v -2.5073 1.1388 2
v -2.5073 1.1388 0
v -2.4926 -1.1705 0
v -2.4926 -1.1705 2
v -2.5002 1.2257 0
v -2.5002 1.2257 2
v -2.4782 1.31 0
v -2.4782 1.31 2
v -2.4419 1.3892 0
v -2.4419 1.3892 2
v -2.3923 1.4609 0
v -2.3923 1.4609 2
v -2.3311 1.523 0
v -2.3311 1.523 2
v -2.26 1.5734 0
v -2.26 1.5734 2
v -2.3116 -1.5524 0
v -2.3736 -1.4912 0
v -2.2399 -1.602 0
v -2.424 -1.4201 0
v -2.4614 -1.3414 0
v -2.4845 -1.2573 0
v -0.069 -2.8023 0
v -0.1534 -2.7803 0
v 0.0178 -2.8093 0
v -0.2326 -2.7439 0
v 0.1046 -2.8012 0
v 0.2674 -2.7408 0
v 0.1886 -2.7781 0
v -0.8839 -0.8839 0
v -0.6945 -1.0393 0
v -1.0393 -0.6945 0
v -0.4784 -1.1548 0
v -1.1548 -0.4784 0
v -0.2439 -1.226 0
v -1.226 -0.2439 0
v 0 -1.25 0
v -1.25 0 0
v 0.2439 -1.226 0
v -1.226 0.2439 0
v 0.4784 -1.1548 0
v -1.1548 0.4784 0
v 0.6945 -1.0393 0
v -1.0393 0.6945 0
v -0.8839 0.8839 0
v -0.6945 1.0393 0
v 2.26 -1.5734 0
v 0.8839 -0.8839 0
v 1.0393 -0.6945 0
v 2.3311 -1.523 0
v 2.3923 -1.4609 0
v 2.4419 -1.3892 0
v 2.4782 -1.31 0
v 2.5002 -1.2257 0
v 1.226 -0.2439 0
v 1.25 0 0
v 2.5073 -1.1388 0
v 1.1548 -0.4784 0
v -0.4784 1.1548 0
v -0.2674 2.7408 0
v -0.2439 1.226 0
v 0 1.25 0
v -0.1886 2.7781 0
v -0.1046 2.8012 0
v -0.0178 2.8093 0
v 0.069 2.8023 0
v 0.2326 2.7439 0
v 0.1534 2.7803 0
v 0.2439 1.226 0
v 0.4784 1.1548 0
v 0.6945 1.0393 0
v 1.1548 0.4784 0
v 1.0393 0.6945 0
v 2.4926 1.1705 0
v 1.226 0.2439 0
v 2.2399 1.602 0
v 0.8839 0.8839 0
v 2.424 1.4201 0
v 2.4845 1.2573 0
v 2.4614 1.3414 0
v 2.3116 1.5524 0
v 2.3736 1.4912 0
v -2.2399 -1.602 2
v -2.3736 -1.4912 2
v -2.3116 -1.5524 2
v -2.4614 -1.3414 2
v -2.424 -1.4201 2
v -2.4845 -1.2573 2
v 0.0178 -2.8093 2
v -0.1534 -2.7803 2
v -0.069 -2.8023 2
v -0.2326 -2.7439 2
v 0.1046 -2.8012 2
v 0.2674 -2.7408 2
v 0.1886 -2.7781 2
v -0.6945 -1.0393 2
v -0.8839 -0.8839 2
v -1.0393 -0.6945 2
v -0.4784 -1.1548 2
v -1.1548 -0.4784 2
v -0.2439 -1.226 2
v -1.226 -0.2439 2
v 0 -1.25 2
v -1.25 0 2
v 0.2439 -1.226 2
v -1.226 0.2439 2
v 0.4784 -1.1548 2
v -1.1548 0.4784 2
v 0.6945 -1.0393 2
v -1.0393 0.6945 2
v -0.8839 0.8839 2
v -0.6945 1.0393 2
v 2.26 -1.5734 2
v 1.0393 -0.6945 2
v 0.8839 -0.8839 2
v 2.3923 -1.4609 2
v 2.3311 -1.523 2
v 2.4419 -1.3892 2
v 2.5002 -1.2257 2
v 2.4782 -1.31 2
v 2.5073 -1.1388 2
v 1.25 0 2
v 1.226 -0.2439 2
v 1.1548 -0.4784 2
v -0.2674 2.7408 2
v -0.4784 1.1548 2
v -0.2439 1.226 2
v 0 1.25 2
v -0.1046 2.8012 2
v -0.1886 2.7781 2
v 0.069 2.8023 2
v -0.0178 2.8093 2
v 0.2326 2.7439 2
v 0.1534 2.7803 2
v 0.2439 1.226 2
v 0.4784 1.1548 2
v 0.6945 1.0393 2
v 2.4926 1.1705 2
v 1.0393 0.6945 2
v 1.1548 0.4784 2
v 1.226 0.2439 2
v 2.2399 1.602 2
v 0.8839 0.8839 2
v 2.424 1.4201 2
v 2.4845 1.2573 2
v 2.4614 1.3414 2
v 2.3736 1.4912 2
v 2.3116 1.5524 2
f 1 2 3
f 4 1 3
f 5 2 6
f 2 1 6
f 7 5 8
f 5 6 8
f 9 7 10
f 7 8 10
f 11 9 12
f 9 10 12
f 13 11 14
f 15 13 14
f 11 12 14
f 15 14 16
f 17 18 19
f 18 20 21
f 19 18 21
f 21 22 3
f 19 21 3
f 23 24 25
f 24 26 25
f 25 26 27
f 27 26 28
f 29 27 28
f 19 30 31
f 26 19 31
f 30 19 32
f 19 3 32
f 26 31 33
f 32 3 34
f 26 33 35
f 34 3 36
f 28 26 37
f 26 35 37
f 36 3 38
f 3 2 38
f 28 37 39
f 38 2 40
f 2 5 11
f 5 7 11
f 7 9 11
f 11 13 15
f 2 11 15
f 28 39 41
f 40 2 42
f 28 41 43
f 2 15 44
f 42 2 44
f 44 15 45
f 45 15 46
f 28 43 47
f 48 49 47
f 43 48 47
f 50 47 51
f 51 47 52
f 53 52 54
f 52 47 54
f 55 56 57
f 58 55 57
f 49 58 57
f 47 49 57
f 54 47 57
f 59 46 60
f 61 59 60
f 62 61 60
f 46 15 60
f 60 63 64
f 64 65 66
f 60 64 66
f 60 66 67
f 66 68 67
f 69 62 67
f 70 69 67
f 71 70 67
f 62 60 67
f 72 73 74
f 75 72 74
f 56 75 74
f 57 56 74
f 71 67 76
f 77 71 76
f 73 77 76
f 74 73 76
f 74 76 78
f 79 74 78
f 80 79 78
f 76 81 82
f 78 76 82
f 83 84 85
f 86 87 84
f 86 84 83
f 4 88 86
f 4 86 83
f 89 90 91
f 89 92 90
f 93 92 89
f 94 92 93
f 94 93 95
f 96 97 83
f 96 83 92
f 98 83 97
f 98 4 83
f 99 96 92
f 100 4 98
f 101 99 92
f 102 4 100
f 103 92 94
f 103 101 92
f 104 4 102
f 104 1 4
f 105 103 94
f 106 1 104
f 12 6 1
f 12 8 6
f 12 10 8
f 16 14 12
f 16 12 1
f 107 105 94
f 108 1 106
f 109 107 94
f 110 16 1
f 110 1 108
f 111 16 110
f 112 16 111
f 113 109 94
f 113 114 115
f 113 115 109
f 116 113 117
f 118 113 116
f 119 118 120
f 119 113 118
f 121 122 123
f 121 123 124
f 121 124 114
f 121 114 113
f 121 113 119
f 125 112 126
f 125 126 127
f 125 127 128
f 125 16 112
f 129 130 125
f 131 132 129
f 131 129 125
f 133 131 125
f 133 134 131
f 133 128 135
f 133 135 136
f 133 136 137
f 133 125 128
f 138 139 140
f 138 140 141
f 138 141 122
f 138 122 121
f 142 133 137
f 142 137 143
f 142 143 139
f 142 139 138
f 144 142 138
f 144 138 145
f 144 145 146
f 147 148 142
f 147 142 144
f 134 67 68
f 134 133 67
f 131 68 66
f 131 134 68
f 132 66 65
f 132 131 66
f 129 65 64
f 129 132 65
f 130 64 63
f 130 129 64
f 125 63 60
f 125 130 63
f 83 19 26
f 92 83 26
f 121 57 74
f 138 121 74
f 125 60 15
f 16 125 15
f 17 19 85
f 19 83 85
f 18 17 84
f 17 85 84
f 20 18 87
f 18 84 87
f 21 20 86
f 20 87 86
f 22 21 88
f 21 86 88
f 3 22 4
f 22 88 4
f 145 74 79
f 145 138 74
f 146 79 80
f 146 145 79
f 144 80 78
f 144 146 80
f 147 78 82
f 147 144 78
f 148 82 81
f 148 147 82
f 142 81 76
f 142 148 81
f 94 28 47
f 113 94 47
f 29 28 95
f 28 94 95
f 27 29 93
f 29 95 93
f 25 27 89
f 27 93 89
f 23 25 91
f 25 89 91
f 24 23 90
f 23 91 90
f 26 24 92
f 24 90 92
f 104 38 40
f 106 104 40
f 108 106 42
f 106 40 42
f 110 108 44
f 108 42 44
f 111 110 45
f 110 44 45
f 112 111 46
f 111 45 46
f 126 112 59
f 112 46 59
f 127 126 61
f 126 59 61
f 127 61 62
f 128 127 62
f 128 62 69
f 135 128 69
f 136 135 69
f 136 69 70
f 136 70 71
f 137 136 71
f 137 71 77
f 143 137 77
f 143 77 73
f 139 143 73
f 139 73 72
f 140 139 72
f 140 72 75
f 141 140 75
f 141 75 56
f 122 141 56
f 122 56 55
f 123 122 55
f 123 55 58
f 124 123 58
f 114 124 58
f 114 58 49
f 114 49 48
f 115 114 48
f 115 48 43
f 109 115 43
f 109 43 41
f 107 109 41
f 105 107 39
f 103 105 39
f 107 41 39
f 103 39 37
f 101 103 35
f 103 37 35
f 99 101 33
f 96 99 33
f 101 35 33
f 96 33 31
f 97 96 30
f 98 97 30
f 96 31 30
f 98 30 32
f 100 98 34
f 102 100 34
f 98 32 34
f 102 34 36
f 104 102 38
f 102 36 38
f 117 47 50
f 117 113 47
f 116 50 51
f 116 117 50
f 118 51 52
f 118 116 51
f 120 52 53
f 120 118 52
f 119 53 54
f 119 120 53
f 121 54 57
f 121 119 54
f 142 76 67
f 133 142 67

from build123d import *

# Parameters (mm, degrees)
F1_DEPTH = 4
F3_D     = 5
F3_DEPTH = 10
F3_TIP   = 1.5021515476
F4_R     = 1
F5_SCALE = 0.5


with BuildPart() as f1:
    # F0 (on Top) → F1 (new body)
    with BuildSketch(Plane.XY):
        Polygon((0.0366512368, -5.7733863564), (5.0182248689, -2.8549522761), (4.9815736321, 2.9184340803), (-0.0366512368, 5.7733863564), (-5.0182248689, 2.8549522761), (-4.9815736321, -2.9184340803), align=None)
    extrude(amount=F1_DEPTH)

    # F3
    with Locations(Plane.XY.offset(4)):
        with Locations((0, 0)):
            Hole(F3_D / 2, depth=F3_DEPTH)
            with Locations((0, 0, -(F3_DEPTH + F3_TIP / 2))):  # 118° drill point
                Cone(0, F3_D / 2, F3_TIP, mode=Mode.SUBTRACT)

    # F4
    f4_edges = [f1.edges().sort_by_distance(p)[0] for p in [
        (-5.018225, 2.854952, 2),
        (-0.036651, 5.773386, 2),
        (-4.981574, -2.918434, 2),
        (0.036651, -5.773386, 2),
        (5.018225, -2.854952, 2),
        (4.981574, 2.918434, 2),
    ]]
    fillet(f4_edges, radius=F4_R)


with BuildPart() as f1_1:
    # F5: moved
    add(f1.part.scale(F5_SCALE))


solid = f1_1.part
